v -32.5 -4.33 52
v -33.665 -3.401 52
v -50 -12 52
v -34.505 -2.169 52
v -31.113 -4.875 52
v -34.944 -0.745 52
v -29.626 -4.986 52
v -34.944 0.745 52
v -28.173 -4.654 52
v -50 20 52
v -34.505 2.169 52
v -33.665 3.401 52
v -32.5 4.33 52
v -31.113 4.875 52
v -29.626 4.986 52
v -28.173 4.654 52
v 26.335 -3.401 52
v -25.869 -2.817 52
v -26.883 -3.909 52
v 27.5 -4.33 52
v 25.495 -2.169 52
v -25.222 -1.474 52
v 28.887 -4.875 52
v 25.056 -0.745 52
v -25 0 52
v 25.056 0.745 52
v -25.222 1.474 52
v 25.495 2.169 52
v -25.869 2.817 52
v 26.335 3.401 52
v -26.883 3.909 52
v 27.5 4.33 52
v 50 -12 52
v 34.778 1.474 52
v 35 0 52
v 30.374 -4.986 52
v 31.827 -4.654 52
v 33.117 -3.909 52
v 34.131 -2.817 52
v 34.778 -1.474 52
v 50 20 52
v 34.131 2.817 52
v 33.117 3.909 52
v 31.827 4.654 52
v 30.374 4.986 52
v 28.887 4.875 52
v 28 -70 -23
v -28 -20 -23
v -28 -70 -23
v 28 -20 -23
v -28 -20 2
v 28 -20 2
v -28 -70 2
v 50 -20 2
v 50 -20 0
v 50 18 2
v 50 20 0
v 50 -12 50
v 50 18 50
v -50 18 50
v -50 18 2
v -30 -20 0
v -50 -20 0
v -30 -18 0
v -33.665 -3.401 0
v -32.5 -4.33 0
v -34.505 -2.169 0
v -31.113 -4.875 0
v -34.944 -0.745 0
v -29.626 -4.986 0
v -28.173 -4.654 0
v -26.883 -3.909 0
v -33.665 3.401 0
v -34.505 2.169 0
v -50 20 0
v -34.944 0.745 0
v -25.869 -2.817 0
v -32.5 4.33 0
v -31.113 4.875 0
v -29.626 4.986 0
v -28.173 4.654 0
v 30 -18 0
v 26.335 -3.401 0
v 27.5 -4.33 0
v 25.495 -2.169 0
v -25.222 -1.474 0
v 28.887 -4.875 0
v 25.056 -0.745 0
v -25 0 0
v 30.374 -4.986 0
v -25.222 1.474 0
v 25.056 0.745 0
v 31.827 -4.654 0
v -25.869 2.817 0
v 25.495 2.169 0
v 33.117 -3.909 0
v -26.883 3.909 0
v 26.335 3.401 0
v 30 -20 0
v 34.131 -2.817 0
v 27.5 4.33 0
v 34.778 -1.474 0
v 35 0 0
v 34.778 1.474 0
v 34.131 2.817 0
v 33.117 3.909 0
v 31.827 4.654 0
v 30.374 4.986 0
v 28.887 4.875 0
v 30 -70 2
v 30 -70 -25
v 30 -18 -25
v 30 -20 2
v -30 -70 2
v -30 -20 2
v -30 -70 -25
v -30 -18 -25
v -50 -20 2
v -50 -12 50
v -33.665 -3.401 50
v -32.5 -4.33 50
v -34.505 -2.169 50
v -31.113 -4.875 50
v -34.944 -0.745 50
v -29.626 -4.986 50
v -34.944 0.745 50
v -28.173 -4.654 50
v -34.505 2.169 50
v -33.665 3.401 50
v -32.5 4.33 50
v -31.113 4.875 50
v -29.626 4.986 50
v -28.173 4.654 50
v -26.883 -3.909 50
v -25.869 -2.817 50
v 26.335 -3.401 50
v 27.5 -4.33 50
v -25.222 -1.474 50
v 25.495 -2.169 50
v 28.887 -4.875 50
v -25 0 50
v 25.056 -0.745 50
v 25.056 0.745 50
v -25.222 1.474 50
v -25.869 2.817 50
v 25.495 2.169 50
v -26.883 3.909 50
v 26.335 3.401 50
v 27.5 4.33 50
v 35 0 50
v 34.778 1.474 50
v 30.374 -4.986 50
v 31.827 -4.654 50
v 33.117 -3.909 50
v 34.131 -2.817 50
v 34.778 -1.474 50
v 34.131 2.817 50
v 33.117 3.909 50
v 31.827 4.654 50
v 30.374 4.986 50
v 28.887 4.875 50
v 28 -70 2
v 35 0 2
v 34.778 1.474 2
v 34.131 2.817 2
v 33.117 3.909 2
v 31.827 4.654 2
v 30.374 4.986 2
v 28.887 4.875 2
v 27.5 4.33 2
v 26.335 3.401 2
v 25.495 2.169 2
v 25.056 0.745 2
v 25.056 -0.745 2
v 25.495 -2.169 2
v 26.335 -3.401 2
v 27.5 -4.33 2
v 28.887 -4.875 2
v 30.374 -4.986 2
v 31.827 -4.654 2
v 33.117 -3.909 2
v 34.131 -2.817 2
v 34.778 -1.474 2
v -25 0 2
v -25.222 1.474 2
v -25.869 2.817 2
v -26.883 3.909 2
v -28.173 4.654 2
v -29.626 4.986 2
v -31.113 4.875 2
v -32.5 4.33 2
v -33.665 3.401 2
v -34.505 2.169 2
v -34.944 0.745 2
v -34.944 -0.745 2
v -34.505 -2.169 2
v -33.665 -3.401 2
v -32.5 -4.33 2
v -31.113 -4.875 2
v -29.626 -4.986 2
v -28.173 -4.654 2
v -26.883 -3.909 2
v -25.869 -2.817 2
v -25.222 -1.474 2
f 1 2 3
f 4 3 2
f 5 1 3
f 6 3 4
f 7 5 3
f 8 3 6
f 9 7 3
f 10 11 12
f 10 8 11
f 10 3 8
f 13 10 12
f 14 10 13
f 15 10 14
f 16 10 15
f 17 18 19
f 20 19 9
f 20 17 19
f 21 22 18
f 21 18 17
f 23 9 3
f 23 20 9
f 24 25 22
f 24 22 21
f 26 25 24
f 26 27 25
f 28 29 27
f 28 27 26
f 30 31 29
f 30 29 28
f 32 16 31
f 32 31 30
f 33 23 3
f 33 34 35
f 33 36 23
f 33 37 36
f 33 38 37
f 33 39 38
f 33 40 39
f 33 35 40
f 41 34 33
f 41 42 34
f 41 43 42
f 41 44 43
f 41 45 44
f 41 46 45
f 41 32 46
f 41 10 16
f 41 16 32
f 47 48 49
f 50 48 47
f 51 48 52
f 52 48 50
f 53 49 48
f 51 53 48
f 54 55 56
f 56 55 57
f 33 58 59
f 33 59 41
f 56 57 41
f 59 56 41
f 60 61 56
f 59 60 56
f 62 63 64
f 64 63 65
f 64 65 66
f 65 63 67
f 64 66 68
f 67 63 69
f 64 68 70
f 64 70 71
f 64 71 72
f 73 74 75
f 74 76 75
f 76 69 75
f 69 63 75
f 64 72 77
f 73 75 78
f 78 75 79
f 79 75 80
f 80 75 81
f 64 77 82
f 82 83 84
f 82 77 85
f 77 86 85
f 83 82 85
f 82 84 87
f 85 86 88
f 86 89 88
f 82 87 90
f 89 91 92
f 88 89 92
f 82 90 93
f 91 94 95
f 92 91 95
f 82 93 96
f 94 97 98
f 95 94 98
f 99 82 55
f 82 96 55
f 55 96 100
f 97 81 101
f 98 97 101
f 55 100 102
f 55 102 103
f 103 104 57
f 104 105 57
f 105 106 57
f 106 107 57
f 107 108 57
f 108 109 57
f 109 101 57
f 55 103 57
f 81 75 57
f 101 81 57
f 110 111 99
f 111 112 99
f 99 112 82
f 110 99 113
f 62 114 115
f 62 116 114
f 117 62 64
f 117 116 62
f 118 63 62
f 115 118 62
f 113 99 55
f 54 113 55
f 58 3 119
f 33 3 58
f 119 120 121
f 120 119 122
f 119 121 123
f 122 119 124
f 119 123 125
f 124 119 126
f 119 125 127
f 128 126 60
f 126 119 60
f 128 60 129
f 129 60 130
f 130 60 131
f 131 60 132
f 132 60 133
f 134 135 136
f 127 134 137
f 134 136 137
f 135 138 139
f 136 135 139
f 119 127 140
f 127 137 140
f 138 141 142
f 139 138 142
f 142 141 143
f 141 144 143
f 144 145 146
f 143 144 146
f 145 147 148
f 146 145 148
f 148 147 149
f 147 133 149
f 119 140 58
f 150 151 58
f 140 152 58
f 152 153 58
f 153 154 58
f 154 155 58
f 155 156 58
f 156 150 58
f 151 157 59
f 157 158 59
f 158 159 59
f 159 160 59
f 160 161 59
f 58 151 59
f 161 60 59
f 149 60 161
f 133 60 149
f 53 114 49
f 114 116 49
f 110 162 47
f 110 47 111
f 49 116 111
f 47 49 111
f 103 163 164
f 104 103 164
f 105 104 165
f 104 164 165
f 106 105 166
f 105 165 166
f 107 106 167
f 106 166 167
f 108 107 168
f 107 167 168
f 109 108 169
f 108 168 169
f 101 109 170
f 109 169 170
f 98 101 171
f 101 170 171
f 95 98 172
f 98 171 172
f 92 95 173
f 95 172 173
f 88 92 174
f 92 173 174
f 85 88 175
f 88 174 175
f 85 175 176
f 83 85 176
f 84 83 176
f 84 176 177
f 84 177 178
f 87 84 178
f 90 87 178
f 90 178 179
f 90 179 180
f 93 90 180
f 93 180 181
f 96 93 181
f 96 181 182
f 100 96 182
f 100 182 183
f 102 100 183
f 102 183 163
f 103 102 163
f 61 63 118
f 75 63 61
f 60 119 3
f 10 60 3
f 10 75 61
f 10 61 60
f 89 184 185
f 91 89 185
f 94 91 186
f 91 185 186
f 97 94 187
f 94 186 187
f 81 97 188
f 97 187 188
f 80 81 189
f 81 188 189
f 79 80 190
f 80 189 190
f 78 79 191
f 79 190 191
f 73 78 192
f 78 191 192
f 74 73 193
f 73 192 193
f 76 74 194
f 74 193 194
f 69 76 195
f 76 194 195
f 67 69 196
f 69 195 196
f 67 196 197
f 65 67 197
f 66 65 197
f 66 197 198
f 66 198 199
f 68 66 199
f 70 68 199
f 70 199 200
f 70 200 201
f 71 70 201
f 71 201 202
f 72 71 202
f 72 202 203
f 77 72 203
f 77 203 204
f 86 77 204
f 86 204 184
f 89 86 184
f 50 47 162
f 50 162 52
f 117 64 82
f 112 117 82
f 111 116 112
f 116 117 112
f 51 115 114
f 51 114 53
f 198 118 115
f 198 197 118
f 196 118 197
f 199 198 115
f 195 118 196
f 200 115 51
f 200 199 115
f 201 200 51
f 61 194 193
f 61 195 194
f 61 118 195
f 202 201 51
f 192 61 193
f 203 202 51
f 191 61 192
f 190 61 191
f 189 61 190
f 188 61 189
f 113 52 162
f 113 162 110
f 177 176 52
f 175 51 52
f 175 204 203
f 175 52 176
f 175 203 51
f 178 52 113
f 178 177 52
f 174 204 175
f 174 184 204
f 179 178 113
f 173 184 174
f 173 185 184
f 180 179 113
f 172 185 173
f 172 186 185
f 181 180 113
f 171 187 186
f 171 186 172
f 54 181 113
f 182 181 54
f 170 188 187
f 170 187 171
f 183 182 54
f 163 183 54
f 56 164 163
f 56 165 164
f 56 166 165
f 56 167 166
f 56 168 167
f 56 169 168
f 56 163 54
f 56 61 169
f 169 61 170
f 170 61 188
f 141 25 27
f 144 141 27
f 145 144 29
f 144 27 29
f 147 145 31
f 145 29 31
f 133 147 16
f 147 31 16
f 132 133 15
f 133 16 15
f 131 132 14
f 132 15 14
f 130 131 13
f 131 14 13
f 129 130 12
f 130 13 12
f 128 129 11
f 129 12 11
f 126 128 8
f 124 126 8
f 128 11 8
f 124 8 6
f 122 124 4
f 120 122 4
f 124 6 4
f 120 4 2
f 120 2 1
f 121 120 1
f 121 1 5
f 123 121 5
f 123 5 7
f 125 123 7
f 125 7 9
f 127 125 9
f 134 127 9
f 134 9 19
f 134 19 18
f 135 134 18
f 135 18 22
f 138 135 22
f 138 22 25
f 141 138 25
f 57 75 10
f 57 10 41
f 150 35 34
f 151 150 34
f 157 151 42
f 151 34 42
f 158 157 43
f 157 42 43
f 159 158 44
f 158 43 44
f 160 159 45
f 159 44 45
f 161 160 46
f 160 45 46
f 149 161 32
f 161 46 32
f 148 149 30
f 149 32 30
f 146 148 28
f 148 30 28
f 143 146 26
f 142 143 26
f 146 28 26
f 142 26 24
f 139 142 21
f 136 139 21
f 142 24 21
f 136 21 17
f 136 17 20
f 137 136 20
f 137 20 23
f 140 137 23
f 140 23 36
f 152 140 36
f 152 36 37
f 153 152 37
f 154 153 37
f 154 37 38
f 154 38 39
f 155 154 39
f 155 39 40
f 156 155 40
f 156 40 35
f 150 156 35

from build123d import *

# Parameters (mm, degrees)
F0_W      = 100
F0_H      = 40
F1_DEPTH  = 2
F2_W      = 100
F2_H      = 2
F3_DEPTH  = 50
F4_W      = 100
F4_H      = 2
F5_DEPTH  = 30
F6_R      = 5
F7_DEPTH  = 100
F8_W      = 60
F8_H      = 2
F9_DEPTH  = 25
F10_W     = 60
F10_H     = 2
F11_DEPTH = 50
F12_W     = 2
F12_H     = 50
F13_DEPTH = 25


with BuildPart() as f1:
    # F0 (on Top) → F1 (new body)
    with BuildSketch(Plane.XY):
        Rectangle(F0_W, F0_H)
    extrude(amount=F1_DEPTH)

    # F2 (on face) → F3 (join)
    with BuildSketch(Plane.XY.offset(2)):
        with Locations((0, 19)):
            Rectangle(F2_W, F2_H)
    extrude(amount=F3_DEPTH)

    # F4 (on face) → F5 (join)
    with BuildSketch(Plane.XZ.offset(-18)):
        with Locations((0, 51)):
            Rectangle(F4_W, F4_H)
    extrude(amount=F5_DEPTH)

    # F6 (on face) → F7 (cut)
    with BuildSketch(Plane.XY.offset(52)):
        with Locations((30, 0)):
            Circle(F6_R)
        with Locations((-30, 0)):
            Circle(F6_R)
    extrude(amount=-F7_DEPTH, mode=Mode.SUBTRACT)

    # F8 (on face) → F9 (join)
    with BuildSketch(Plane(origin=(0, 0, 0), x_dir=(1, 0, 0), z_dir=(0, 0, -1))):
        with Locations((0, 19)):
            Rectangle(F8_W, F8_H)
    extrude(amount=F9_DEPTH)

    # F10 (on face) → F11 (join)
    with BuildSketch(Plane.XZ.offset(20)):
        with Locations((0, -24)):
            Rectangle(F10_W, F10_H)
    extrude(amount=F11_DEPTH)

    # F12 (on face) → F13 (join)
    with BuildSketch(Plane.XY.offset(-23)):
        with Locations((-29, -45)):
            Rectangle(F12_W, F12_H)
        with Locations((29, -45)):
            Rectangle(F12_W, F12_H)
    extrude(amount=F13_DEPTH)


solid = f1.part
